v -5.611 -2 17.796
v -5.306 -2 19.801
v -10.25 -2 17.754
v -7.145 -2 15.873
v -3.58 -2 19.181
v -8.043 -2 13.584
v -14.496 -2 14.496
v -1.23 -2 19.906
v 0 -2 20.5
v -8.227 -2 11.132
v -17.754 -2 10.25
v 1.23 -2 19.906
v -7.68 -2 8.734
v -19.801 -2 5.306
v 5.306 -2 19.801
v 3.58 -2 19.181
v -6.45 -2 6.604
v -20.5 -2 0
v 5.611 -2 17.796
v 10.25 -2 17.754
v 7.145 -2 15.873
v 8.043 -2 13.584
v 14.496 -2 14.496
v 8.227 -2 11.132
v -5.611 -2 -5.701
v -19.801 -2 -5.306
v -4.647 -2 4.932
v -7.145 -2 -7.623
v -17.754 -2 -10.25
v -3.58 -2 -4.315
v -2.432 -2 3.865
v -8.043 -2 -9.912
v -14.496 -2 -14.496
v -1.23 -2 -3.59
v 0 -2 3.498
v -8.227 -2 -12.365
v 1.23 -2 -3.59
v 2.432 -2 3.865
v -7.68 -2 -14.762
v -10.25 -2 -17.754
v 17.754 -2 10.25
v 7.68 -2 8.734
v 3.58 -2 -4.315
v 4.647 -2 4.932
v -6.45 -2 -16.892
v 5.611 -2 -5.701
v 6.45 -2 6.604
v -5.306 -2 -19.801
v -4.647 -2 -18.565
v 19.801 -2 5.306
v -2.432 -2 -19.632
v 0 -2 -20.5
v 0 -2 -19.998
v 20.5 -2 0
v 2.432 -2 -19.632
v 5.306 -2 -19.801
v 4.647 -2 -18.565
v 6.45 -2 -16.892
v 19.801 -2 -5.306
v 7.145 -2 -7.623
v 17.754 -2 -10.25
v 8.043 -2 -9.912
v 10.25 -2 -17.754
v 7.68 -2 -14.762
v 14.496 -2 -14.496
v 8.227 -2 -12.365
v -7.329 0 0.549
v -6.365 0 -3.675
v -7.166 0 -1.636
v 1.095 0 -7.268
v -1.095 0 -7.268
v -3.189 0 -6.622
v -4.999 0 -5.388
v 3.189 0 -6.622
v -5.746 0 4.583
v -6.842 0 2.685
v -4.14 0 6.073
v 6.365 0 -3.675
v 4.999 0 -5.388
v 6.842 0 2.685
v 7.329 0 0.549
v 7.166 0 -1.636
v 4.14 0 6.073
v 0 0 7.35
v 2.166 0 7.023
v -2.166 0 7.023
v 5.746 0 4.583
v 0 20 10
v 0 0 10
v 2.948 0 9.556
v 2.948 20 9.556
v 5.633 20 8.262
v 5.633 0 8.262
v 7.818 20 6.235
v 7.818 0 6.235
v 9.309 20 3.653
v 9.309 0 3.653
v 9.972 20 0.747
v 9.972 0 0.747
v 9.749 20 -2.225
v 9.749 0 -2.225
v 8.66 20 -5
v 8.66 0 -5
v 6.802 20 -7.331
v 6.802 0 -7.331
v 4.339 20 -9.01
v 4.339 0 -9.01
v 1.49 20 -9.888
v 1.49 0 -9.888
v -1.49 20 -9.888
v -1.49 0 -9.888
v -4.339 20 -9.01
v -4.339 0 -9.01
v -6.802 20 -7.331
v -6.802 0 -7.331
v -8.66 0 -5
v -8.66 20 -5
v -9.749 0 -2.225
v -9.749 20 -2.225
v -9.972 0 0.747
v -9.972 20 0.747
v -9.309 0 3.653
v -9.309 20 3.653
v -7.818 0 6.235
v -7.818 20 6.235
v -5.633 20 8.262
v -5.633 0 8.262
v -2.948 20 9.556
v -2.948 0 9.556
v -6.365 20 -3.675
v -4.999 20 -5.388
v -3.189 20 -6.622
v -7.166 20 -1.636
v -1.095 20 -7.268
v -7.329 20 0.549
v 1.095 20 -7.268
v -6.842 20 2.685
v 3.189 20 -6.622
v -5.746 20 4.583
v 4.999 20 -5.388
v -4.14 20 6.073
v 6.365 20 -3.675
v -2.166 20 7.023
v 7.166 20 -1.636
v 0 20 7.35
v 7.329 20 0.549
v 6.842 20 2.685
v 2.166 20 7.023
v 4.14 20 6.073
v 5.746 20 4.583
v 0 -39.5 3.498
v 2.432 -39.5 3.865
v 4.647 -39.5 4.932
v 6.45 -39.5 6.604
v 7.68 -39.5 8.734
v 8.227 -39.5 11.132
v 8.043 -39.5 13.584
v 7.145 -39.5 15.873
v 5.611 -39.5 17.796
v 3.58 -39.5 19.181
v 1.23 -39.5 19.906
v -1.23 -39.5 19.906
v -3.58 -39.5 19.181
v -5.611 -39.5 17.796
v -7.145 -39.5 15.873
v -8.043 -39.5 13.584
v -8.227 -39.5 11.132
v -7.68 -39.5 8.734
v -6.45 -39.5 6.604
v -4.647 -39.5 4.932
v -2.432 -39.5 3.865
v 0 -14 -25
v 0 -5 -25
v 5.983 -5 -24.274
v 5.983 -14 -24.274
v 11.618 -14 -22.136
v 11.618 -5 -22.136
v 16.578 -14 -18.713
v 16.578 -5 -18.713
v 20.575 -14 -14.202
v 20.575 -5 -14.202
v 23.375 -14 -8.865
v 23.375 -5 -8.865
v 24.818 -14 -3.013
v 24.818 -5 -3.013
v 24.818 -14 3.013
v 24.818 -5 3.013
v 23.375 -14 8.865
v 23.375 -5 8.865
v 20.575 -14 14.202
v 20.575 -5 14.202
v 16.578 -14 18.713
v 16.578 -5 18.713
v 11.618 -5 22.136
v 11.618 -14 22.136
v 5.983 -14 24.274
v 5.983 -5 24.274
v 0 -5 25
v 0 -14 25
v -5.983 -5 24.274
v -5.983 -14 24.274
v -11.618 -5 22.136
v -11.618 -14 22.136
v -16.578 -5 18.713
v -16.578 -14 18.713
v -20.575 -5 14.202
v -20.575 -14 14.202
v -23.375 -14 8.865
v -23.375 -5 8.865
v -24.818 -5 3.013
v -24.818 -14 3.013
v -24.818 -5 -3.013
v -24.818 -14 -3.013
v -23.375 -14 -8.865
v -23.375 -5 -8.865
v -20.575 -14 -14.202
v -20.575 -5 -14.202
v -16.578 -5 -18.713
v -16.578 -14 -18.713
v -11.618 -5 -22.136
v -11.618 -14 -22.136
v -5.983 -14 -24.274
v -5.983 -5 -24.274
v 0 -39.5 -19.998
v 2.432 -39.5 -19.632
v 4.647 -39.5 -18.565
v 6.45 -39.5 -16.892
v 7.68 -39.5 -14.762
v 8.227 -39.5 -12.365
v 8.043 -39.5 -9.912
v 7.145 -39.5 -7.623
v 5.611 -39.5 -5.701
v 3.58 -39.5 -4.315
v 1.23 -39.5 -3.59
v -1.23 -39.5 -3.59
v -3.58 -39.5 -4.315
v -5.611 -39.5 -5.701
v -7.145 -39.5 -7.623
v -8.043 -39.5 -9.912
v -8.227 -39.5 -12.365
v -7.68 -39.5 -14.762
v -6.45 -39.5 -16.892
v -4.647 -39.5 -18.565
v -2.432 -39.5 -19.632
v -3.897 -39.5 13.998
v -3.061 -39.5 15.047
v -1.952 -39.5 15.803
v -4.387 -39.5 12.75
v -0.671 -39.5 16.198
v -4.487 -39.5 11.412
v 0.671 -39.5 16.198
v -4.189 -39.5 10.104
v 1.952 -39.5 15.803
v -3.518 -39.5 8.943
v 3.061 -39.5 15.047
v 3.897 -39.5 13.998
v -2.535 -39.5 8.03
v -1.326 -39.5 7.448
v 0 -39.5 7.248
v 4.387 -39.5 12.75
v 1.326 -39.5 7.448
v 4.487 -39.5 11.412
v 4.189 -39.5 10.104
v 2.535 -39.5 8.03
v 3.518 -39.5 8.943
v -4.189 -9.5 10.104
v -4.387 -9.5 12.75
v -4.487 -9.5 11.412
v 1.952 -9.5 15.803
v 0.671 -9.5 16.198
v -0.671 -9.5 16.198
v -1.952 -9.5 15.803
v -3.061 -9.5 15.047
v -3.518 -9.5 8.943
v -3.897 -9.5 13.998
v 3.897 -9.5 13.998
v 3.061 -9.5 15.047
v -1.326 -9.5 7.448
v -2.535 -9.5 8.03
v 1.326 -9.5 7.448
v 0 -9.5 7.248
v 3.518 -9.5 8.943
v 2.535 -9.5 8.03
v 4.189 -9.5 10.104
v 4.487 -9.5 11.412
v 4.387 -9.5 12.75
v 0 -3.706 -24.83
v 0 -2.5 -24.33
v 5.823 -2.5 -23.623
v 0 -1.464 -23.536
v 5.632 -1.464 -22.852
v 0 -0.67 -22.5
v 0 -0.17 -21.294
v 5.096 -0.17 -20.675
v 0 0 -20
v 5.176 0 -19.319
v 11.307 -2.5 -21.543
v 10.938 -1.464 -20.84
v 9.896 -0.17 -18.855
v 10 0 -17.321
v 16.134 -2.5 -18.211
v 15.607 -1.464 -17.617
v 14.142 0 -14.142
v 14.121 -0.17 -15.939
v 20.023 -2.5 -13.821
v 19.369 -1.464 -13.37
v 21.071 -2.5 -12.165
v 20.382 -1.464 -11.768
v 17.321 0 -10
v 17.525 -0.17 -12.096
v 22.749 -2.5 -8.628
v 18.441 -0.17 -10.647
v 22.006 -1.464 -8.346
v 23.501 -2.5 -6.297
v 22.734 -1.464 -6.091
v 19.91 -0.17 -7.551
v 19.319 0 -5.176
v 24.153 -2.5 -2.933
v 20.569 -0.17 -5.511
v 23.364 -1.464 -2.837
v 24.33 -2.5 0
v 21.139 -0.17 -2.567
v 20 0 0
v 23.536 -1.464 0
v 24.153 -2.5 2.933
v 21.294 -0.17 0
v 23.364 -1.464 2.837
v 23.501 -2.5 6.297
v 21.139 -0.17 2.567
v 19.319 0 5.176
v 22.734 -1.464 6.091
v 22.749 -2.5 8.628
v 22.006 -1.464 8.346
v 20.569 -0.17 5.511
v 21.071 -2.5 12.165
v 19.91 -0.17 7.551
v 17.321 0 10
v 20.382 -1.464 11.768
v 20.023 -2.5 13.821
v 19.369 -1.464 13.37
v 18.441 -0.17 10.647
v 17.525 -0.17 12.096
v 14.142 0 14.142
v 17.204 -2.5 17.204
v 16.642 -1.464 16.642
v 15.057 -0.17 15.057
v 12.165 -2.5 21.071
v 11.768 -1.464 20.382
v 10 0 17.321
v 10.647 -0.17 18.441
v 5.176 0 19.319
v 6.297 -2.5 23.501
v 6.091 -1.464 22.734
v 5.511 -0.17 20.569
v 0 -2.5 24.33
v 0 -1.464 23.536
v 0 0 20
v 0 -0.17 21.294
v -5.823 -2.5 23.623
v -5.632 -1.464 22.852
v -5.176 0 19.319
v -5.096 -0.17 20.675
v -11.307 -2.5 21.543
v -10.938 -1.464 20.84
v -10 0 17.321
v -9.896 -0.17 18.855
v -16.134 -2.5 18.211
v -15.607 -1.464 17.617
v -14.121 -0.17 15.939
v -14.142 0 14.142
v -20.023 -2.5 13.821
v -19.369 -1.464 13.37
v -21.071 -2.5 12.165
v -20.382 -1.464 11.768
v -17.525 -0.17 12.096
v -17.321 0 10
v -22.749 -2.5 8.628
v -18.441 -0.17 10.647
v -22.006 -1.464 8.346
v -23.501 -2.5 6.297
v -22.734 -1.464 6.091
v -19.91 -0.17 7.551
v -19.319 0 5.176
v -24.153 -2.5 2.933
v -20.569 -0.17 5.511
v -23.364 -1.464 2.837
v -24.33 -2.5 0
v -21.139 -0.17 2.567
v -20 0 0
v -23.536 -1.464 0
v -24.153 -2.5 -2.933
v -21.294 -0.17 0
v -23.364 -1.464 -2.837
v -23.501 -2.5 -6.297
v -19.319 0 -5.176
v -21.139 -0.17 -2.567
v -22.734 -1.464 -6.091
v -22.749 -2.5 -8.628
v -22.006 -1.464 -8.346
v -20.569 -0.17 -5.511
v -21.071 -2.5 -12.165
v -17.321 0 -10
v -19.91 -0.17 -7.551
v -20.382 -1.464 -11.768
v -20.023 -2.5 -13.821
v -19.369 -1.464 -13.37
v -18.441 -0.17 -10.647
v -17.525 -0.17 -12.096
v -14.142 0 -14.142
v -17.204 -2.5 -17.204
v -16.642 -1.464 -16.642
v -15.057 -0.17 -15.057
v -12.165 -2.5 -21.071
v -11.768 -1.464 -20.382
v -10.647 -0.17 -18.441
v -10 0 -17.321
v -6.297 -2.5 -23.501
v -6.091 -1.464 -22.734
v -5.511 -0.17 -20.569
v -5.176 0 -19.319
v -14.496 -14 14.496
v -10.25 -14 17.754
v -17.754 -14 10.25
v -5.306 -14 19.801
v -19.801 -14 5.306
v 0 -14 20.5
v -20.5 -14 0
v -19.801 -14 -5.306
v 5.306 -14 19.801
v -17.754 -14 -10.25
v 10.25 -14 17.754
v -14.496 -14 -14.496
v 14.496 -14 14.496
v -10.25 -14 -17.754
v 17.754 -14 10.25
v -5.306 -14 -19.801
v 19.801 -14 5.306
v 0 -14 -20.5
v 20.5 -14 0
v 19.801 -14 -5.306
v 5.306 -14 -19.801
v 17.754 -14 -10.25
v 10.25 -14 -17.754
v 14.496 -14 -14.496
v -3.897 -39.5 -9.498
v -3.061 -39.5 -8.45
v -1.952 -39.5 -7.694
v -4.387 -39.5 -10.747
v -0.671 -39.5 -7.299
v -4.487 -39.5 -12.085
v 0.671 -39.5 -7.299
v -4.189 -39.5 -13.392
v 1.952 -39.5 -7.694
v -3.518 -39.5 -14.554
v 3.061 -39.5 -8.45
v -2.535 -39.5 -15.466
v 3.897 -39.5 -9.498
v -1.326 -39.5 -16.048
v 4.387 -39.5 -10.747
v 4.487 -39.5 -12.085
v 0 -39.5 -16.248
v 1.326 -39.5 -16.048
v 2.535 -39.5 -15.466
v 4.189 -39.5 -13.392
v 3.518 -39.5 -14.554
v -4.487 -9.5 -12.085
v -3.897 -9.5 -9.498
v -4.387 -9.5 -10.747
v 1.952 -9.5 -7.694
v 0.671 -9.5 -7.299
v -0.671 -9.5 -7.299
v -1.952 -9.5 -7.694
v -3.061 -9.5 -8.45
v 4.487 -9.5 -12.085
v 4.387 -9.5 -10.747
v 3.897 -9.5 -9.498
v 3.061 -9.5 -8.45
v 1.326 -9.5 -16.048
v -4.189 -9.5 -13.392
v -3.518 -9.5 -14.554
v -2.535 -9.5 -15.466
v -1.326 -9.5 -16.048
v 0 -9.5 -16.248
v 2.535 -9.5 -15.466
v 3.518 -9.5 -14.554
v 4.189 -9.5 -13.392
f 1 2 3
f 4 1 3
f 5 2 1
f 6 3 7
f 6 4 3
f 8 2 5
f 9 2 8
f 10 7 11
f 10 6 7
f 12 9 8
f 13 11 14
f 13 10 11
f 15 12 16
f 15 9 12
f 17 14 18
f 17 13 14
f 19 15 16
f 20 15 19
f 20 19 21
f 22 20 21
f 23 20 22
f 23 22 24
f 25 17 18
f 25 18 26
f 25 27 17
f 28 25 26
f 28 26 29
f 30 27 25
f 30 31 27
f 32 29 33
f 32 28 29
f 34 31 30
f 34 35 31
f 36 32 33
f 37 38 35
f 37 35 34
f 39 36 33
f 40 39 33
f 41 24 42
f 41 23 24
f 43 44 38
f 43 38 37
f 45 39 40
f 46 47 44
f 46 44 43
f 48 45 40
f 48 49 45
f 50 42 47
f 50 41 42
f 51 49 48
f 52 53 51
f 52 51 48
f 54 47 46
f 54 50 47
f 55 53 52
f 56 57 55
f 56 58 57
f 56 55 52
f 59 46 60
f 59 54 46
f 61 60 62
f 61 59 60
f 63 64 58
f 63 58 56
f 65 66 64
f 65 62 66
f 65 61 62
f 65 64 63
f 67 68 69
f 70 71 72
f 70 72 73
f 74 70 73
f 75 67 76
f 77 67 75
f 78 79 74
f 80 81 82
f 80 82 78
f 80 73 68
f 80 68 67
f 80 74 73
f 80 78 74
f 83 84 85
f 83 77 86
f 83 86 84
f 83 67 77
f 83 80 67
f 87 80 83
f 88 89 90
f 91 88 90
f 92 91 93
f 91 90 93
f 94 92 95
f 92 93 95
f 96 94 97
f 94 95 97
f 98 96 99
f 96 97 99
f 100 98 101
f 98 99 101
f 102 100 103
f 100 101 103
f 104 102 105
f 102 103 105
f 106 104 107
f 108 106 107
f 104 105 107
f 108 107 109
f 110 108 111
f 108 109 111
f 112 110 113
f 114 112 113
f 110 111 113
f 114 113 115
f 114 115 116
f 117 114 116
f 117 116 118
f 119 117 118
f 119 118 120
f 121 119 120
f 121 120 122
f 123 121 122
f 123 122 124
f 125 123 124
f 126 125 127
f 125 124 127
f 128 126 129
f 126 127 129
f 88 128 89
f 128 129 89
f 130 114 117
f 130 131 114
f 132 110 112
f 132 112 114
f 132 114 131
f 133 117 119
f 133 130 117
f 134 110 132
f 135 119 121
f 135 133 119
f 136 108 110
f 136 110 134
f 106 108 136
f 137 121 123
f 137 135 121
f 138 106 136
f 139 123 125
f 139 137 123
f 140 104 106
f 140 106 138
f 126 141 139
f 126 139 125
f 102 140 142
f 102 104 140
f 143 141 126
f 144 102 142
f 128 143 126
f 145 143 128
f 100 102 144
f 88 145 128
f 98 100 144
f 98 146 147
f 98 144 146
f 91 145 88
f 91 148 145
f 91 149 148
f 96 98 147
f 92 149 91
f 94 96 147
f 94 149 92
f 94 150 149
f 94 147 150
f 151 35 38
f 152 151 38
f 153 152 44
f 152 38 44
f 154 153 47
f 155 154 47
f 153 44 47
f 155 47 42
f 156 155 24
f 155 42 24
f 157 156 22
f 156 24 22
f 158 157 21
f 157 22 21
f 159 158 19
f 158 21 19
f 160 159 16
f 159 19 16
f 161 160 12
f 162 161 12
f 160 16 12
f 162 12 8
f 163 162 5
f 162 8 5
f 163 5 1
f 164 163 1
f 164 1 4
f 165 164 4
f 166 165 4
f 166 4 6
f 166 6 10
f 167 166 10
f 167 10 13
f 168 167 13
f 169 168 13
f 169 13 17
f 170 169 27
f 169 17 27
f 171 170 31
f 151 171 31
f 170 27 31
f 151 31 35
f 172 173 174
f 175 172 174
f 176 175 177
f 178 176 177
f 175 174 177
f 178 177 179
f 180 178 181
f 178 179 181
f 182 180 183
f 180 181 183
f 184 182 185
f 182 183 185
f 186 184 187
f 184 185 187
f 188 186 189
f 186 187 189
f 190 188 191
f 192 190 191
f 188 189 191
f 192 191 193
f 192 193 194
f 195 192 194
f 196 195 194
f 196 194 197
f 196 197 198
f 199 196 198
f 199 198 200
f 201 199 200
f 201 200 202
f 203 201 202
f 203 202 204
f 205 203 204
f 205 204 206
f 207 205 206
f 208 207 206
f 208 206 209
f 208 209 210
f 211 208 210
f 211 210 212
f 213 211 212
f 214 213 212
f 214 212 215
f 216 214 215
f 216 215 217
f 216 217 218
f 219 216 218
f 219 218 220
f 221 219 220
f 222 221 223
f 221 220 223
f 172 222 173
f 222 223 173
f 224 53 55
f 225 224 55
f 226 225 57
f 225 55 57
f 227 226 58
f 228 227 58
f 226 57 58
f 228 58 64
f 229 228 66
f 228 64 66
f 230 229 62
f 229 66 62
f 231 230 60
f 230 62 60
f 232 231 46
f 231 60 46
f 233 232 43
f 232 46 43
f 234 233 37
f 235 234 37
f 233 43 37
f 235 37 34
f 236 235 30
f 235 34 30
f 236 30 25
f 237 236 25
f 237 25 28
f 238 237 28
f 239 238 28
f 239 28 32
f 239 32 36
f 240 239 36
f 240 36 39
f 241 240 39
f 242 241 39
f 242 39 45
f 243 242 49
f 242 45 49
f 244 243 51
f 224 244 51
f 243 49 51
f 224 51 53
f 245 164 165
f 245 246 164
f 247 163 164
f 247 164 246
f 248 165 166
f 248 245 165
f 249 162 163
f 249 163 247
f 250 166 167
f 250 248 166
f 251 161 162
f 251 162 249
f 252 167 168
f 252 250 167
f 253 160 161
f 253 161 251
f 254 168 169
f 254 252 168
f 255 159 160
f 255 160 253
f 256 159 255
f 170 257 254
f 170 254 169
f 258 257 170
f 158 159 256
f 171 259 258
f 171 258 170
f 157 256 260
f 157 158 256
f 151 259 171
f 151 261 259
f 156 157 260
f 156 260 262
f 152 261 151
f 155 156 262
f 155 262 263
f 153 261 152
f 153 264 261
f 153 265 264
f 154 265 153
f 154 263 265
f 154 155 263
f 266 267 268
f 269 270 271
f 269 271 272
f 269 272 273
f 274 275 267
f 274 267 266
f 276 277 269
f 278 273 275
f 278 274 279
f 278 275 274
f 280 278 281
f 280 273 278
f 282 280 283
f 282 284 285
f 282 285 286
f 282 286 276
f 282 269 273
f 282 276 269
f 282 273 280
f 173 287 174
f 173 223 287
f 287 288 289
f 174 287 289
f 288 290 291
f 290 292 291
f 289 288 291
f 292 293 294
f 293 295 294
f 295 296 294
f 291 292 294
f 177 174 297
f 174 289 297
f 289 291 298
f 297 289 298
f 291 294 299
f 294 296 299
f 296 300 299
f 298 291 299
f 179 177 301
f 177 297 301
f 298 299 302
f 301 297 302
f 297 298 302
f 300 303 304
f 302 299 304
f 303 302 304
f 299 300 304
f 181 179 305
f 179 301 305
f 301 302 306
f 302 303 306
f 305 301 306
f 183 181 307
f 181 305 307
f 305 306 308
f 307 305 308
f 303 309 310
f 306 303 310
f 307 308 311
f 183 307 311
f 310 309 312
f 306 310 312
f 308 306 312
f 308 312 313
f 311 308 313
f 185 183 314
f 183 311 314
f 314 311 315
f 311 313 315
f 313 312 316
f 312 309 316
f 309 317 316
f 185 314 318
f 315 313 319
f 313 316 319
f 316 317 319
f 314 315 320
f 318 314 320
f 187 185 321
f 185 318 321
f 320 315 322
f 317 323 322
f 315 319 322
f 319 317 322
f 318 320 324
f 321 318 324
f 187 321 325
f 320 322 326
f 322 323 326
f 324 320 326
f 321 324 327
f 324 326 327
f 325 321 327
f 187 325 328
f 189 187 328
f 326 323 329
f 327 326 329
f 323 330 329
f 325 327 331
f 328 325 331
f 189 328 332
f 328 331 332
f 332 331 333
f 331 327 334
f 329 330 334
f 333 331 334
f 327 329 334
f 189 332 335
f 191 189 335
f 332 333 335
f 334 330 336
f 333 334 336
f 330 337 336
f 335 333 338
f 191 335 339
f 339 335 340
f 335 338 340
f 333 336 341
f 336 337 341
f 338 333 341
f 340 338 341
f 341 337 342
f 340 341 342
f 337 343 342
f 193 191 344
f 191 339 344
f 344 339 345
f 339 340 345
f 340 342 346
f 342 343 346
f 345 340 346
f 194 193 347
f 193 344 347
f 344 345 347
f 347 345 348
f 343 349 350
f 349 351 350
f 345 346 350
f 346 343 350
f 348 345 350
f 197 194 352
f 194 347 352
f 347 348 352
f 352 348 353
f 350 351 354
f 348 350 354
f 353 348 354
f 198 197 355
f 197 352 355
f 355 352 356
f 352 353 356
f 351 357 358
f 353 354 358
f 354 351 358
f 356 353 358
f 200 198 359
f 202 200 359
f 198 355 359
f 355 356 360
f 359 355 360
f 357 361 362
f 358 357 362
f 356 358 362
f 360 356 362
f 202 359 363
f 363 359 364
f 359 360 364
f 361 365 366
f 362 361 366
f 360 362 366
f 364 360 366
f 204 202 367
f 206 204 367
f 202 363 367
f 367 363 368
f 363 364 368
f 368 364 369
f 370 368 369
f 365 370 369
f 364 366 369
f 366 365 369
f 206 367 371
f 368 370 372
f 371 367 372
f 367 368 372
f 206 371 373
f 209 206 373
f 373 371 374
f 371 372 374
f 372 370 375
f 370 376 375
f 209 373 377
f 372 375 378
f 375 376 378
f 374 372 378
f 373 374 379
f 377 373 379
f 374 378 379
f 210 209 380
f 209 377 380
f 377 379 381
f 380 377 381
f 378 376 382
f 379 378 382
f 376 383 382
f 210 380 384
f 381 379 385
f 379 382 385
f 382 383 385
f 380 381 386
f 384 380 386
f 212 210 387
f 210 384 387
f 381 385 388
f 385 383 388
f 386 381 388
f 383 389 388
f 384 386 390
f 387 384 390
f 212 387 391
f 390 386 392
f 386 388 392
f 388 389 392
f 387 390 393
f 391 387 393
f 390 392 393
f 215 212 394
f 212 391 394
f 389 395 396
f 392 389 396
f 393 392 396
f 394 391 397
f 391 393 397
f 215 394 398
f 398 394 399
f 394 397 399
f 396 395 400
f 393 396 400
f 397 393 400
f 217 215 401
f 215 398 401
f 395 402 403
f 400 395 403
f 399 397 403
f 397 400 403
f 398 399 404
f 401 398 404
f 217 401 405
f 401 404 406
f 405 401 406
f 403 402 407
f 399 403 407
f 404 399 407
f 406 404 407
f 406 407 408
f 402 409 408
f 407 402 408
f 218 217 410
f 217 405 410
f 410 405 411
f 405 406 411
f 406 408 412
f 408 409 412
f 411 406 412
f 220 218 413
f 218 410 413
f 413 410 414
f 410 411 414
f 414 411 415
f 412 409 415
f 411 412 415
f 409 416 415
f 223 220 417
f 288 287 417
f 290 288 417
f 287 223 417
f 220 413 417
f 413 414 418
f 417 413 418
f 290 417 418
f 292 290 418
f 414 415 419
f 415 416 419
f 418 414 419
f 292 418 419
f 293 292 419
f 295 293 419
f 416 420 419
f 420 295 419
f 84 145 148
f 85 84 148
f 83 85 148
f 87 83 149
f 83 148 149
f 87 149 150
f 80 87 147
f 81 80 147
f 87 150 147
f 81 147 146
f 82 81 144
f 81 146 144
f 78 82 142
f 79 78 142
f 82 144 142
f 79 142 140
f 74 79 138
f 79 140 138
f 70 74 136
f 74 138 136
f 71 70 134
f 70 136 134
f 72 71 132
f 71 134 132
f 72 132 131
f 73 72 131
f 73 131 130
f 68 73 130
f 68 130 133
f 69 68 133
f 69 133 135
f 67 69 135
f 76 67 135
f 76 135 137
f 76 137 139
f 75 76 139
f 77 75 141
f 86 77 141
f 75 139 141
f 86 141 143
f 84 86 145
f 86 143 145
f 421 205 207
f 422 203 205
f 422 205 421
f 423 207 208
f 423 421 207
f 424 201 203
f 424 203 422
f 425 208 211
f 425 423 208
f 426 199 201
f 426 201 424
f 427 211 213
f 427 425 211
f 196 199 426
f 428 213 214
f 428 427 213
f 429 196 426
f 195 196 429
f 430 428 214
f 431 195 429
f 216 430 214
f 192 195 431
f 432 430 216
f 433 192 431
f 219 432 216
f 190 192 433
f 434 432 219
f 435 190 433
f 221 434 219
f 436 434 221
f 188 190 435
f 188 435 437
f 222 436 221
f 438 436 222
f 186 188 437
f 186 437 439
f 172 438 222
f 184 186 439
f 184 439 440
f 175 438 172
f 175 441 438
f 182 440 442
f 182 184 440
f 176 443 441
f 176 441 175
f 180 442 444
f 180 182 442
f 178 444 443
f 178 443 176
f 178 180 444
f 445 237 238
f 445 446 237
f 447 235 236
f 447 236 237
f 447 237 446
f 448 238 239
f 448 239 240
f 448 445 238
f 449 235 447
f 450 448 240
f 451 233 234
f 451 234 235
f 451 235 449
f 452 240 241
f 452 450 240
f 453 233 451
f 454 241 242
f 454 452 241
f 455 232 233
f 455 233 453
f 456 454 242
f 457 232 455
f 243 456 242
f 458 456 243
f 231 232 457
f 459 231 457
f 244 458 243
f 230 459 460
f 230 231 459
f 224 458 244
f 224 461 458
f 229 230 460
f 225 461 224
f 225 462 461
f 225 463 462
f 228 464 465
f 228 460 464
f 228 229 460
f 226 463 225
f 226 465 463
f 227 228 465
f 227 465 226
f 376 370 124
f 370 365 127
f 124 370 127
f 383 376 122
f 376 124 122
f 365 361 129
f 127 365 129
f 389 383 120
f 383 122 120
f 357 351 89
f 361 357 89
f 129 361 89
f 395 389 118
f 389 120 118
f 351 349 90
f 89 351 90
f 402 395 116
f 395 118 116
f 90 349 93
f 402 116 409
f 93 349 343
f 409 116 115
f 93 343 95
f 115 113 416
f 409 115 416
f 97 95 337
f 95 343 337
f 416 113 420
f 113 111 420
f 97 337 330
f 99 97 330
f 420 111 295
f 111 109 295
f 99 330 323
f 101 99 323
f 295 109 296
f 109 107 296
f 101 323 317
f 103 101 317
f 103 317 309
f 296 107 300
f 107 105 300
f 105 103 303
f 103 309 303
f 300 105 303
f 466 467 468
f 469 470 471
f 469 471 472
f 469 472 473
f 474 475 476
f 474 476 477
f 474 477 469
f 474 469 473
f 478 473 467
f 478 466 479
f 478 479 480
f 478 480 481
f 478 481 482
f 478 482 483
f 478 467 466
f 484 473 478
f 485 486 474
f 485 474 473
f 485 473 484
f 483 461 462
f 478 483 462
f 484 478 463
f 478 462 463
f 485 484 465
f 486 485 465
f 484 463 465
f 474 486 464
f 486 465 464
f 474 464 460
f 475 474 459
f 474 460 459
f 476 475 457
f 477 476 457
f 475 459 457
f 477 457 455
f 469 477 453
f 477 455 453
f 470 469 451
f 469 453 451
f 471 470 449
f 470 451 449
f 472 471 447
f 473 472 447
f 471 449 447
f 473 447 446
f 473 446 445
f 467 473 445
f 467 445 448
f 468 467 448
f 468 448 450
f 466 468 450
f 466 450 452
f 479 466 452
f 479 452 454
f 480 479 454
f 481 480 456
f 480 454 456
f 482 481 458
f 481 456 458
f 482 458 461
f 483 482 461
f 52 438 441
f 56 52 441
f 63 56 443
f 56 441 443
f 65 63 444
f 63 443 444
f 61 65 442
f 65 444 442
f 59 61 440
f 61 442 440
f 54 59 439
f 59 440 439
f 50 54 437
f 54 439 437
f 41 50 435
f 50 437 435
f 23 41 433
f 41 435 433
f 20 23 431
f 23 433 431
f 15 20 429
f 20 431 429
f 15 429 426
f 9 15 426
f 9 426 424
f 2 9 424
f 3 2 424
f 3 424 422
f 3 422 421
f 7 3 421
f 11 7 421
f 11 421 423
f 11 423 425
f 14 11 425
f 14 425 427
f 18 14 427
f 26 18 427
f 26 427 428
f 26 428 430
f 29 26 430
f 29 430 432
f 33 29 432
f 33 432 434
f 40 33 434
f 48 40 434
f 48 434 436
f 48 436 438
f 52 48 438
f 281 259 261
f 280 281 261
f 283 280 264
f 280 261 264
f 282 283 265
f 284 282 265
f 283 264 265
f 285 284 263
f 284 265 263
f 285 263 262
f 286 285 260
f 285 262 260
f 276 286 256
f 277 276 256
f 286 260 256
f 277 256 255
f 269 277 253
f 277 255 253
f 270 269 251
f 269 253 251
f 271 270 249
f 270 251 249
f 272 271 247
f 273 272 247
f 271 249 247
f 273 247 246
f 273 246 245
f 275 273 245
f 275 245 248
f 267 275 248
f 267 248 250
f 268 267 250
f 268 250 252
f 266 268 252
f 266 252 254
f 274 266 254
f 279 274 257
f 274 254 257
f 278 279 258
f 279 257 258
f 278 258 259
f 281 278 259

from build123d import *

# Parameters (mm, degrees)
SKETCH1_R           = 10
BOSS_EXTRUDE1_DEPTH = 20
SKETCH2_R           = 25
BOSS_EXTRUDE2_DEPTH = 22
SKETCH3_R           = 20.5
CUT_EXTRUDE1_DEPTH  = 20
FILLET1_R           = 5
SKETCH4_R           = 7.35
CUT_EXTRUDE2_DEPTH  = 20
SKETCH5_R           = 8.25
BOSS_EXTRUDE3_DEPTH = 37.5
SKETCH6_R           = 4.5
CUT_EXTRUDE3_DEPTH  = 30
SKETCH7_R           = 25
SKETCH7_R_2         = 20.5
CUT_EXTRUDE4_DEPTH  = 8


with BuildPart() as part:
    # Sketch1 → Boss-Extrude1 (new body)
    with BuildSketch(Plane(origin=(0, 0, 0), x_dir=(1, 0, 0), z_dir=(0, 1, 0))):
        with Locations(Location((0, 0, 0), (0, 0, 270))):
            Circle(SKETCH1_R)
    extrude(amount=BOSS_EXTRUDE1_DEPTH)

    # Sketch2 → Boss-Extrude2 (add)
    with BuildSketch(Plane.XZ):
        with Locations(Location((0, 0, 0), (0, 0, 270))):
            Circle(SKETCH2_R)
    extrude(amount=BOSS_EXTRUDE2_DEPTH)

    # Sketch3 → Cut-Extrude1 (cut)
    with BuildSketch(Plane.XZ.offset(22)):
        with Locations(Location((0, 0, 0), (0, 0, 270))):
            Circle(SKETCH3_R)
    extrude(amount=-CUT_EXTRUDE1_DEPTH, mode=Mode.SUBTRACT)

    # Fillet1
    fillet1_edges = [part.edges().sort_by_distance(p)[0] for p in [
        (0, 0, 25),
    ]]
    fillet(fillet1_edges, radius=FILLET1_R)

    # Sketch4 → Cut-Extrude2 (cut)
    with BuildSketch(Plane(origin=(0, 20, 0), x_dir=(1, 0, 0), z_dir=(0, 1, 0))):
        with Locations(Location((0, 0, 0), (0, 0, 270))):
            Circle(SKETCH4_R)
    extrude(amount=-CUT_EXTRUDE2_DEPTH, mode=Mode.SUBTRACT)

    # Sketch5 → Boss-Extrude3 (add)
    with BuildSketch(Plane.XZ.offset(2)):
        with Locations(Location((0, 11.748259103, 0), (0, 0, 270))):
            Circle(SKETCH5_R)
        with Locations(Location((0, -11.748259103, 0), (0, 0, 270))):
            Circle(SKETCH5_R)
    extrude(amount=BOSS_EXTRUDE3_DEPTH)

    # Sketch6 → Cut-Extrude3 (cut)
    with BuildSketch(Plane.XZ.offset(39.5)):
        with Locations(Location((0, 11.748259103, 0), (0, 0, 270))):
            Circle(SKETCH6_R)
        with Locations(Location((0, -11.748259103, 0), (0, 0, 270))):
            Circle(SKETCH6_R)
    extrude(amount=-CUT_EXTRUDE3_DEPTH, mode=Mode.SUBTRACT)

    # Sketch7 → Cut-Extrude4 (cut)
    with BuildSketch(Plane.XZ.offset(22)):
        with Locations(Location((0, 0, 0), (0, 0, 270))):
            Circle(SKETCH7_R)
        with Locations(Location((0, 0, 0), (0, 0, 270))):
            Circle(SKETCH7_R_2, mode=Mode.SUBTRACT)
    extrude(amount=-CUT_EXTRUDE4_DEPTH, mode=Mode.SUBTRACT)


solid = part.part
